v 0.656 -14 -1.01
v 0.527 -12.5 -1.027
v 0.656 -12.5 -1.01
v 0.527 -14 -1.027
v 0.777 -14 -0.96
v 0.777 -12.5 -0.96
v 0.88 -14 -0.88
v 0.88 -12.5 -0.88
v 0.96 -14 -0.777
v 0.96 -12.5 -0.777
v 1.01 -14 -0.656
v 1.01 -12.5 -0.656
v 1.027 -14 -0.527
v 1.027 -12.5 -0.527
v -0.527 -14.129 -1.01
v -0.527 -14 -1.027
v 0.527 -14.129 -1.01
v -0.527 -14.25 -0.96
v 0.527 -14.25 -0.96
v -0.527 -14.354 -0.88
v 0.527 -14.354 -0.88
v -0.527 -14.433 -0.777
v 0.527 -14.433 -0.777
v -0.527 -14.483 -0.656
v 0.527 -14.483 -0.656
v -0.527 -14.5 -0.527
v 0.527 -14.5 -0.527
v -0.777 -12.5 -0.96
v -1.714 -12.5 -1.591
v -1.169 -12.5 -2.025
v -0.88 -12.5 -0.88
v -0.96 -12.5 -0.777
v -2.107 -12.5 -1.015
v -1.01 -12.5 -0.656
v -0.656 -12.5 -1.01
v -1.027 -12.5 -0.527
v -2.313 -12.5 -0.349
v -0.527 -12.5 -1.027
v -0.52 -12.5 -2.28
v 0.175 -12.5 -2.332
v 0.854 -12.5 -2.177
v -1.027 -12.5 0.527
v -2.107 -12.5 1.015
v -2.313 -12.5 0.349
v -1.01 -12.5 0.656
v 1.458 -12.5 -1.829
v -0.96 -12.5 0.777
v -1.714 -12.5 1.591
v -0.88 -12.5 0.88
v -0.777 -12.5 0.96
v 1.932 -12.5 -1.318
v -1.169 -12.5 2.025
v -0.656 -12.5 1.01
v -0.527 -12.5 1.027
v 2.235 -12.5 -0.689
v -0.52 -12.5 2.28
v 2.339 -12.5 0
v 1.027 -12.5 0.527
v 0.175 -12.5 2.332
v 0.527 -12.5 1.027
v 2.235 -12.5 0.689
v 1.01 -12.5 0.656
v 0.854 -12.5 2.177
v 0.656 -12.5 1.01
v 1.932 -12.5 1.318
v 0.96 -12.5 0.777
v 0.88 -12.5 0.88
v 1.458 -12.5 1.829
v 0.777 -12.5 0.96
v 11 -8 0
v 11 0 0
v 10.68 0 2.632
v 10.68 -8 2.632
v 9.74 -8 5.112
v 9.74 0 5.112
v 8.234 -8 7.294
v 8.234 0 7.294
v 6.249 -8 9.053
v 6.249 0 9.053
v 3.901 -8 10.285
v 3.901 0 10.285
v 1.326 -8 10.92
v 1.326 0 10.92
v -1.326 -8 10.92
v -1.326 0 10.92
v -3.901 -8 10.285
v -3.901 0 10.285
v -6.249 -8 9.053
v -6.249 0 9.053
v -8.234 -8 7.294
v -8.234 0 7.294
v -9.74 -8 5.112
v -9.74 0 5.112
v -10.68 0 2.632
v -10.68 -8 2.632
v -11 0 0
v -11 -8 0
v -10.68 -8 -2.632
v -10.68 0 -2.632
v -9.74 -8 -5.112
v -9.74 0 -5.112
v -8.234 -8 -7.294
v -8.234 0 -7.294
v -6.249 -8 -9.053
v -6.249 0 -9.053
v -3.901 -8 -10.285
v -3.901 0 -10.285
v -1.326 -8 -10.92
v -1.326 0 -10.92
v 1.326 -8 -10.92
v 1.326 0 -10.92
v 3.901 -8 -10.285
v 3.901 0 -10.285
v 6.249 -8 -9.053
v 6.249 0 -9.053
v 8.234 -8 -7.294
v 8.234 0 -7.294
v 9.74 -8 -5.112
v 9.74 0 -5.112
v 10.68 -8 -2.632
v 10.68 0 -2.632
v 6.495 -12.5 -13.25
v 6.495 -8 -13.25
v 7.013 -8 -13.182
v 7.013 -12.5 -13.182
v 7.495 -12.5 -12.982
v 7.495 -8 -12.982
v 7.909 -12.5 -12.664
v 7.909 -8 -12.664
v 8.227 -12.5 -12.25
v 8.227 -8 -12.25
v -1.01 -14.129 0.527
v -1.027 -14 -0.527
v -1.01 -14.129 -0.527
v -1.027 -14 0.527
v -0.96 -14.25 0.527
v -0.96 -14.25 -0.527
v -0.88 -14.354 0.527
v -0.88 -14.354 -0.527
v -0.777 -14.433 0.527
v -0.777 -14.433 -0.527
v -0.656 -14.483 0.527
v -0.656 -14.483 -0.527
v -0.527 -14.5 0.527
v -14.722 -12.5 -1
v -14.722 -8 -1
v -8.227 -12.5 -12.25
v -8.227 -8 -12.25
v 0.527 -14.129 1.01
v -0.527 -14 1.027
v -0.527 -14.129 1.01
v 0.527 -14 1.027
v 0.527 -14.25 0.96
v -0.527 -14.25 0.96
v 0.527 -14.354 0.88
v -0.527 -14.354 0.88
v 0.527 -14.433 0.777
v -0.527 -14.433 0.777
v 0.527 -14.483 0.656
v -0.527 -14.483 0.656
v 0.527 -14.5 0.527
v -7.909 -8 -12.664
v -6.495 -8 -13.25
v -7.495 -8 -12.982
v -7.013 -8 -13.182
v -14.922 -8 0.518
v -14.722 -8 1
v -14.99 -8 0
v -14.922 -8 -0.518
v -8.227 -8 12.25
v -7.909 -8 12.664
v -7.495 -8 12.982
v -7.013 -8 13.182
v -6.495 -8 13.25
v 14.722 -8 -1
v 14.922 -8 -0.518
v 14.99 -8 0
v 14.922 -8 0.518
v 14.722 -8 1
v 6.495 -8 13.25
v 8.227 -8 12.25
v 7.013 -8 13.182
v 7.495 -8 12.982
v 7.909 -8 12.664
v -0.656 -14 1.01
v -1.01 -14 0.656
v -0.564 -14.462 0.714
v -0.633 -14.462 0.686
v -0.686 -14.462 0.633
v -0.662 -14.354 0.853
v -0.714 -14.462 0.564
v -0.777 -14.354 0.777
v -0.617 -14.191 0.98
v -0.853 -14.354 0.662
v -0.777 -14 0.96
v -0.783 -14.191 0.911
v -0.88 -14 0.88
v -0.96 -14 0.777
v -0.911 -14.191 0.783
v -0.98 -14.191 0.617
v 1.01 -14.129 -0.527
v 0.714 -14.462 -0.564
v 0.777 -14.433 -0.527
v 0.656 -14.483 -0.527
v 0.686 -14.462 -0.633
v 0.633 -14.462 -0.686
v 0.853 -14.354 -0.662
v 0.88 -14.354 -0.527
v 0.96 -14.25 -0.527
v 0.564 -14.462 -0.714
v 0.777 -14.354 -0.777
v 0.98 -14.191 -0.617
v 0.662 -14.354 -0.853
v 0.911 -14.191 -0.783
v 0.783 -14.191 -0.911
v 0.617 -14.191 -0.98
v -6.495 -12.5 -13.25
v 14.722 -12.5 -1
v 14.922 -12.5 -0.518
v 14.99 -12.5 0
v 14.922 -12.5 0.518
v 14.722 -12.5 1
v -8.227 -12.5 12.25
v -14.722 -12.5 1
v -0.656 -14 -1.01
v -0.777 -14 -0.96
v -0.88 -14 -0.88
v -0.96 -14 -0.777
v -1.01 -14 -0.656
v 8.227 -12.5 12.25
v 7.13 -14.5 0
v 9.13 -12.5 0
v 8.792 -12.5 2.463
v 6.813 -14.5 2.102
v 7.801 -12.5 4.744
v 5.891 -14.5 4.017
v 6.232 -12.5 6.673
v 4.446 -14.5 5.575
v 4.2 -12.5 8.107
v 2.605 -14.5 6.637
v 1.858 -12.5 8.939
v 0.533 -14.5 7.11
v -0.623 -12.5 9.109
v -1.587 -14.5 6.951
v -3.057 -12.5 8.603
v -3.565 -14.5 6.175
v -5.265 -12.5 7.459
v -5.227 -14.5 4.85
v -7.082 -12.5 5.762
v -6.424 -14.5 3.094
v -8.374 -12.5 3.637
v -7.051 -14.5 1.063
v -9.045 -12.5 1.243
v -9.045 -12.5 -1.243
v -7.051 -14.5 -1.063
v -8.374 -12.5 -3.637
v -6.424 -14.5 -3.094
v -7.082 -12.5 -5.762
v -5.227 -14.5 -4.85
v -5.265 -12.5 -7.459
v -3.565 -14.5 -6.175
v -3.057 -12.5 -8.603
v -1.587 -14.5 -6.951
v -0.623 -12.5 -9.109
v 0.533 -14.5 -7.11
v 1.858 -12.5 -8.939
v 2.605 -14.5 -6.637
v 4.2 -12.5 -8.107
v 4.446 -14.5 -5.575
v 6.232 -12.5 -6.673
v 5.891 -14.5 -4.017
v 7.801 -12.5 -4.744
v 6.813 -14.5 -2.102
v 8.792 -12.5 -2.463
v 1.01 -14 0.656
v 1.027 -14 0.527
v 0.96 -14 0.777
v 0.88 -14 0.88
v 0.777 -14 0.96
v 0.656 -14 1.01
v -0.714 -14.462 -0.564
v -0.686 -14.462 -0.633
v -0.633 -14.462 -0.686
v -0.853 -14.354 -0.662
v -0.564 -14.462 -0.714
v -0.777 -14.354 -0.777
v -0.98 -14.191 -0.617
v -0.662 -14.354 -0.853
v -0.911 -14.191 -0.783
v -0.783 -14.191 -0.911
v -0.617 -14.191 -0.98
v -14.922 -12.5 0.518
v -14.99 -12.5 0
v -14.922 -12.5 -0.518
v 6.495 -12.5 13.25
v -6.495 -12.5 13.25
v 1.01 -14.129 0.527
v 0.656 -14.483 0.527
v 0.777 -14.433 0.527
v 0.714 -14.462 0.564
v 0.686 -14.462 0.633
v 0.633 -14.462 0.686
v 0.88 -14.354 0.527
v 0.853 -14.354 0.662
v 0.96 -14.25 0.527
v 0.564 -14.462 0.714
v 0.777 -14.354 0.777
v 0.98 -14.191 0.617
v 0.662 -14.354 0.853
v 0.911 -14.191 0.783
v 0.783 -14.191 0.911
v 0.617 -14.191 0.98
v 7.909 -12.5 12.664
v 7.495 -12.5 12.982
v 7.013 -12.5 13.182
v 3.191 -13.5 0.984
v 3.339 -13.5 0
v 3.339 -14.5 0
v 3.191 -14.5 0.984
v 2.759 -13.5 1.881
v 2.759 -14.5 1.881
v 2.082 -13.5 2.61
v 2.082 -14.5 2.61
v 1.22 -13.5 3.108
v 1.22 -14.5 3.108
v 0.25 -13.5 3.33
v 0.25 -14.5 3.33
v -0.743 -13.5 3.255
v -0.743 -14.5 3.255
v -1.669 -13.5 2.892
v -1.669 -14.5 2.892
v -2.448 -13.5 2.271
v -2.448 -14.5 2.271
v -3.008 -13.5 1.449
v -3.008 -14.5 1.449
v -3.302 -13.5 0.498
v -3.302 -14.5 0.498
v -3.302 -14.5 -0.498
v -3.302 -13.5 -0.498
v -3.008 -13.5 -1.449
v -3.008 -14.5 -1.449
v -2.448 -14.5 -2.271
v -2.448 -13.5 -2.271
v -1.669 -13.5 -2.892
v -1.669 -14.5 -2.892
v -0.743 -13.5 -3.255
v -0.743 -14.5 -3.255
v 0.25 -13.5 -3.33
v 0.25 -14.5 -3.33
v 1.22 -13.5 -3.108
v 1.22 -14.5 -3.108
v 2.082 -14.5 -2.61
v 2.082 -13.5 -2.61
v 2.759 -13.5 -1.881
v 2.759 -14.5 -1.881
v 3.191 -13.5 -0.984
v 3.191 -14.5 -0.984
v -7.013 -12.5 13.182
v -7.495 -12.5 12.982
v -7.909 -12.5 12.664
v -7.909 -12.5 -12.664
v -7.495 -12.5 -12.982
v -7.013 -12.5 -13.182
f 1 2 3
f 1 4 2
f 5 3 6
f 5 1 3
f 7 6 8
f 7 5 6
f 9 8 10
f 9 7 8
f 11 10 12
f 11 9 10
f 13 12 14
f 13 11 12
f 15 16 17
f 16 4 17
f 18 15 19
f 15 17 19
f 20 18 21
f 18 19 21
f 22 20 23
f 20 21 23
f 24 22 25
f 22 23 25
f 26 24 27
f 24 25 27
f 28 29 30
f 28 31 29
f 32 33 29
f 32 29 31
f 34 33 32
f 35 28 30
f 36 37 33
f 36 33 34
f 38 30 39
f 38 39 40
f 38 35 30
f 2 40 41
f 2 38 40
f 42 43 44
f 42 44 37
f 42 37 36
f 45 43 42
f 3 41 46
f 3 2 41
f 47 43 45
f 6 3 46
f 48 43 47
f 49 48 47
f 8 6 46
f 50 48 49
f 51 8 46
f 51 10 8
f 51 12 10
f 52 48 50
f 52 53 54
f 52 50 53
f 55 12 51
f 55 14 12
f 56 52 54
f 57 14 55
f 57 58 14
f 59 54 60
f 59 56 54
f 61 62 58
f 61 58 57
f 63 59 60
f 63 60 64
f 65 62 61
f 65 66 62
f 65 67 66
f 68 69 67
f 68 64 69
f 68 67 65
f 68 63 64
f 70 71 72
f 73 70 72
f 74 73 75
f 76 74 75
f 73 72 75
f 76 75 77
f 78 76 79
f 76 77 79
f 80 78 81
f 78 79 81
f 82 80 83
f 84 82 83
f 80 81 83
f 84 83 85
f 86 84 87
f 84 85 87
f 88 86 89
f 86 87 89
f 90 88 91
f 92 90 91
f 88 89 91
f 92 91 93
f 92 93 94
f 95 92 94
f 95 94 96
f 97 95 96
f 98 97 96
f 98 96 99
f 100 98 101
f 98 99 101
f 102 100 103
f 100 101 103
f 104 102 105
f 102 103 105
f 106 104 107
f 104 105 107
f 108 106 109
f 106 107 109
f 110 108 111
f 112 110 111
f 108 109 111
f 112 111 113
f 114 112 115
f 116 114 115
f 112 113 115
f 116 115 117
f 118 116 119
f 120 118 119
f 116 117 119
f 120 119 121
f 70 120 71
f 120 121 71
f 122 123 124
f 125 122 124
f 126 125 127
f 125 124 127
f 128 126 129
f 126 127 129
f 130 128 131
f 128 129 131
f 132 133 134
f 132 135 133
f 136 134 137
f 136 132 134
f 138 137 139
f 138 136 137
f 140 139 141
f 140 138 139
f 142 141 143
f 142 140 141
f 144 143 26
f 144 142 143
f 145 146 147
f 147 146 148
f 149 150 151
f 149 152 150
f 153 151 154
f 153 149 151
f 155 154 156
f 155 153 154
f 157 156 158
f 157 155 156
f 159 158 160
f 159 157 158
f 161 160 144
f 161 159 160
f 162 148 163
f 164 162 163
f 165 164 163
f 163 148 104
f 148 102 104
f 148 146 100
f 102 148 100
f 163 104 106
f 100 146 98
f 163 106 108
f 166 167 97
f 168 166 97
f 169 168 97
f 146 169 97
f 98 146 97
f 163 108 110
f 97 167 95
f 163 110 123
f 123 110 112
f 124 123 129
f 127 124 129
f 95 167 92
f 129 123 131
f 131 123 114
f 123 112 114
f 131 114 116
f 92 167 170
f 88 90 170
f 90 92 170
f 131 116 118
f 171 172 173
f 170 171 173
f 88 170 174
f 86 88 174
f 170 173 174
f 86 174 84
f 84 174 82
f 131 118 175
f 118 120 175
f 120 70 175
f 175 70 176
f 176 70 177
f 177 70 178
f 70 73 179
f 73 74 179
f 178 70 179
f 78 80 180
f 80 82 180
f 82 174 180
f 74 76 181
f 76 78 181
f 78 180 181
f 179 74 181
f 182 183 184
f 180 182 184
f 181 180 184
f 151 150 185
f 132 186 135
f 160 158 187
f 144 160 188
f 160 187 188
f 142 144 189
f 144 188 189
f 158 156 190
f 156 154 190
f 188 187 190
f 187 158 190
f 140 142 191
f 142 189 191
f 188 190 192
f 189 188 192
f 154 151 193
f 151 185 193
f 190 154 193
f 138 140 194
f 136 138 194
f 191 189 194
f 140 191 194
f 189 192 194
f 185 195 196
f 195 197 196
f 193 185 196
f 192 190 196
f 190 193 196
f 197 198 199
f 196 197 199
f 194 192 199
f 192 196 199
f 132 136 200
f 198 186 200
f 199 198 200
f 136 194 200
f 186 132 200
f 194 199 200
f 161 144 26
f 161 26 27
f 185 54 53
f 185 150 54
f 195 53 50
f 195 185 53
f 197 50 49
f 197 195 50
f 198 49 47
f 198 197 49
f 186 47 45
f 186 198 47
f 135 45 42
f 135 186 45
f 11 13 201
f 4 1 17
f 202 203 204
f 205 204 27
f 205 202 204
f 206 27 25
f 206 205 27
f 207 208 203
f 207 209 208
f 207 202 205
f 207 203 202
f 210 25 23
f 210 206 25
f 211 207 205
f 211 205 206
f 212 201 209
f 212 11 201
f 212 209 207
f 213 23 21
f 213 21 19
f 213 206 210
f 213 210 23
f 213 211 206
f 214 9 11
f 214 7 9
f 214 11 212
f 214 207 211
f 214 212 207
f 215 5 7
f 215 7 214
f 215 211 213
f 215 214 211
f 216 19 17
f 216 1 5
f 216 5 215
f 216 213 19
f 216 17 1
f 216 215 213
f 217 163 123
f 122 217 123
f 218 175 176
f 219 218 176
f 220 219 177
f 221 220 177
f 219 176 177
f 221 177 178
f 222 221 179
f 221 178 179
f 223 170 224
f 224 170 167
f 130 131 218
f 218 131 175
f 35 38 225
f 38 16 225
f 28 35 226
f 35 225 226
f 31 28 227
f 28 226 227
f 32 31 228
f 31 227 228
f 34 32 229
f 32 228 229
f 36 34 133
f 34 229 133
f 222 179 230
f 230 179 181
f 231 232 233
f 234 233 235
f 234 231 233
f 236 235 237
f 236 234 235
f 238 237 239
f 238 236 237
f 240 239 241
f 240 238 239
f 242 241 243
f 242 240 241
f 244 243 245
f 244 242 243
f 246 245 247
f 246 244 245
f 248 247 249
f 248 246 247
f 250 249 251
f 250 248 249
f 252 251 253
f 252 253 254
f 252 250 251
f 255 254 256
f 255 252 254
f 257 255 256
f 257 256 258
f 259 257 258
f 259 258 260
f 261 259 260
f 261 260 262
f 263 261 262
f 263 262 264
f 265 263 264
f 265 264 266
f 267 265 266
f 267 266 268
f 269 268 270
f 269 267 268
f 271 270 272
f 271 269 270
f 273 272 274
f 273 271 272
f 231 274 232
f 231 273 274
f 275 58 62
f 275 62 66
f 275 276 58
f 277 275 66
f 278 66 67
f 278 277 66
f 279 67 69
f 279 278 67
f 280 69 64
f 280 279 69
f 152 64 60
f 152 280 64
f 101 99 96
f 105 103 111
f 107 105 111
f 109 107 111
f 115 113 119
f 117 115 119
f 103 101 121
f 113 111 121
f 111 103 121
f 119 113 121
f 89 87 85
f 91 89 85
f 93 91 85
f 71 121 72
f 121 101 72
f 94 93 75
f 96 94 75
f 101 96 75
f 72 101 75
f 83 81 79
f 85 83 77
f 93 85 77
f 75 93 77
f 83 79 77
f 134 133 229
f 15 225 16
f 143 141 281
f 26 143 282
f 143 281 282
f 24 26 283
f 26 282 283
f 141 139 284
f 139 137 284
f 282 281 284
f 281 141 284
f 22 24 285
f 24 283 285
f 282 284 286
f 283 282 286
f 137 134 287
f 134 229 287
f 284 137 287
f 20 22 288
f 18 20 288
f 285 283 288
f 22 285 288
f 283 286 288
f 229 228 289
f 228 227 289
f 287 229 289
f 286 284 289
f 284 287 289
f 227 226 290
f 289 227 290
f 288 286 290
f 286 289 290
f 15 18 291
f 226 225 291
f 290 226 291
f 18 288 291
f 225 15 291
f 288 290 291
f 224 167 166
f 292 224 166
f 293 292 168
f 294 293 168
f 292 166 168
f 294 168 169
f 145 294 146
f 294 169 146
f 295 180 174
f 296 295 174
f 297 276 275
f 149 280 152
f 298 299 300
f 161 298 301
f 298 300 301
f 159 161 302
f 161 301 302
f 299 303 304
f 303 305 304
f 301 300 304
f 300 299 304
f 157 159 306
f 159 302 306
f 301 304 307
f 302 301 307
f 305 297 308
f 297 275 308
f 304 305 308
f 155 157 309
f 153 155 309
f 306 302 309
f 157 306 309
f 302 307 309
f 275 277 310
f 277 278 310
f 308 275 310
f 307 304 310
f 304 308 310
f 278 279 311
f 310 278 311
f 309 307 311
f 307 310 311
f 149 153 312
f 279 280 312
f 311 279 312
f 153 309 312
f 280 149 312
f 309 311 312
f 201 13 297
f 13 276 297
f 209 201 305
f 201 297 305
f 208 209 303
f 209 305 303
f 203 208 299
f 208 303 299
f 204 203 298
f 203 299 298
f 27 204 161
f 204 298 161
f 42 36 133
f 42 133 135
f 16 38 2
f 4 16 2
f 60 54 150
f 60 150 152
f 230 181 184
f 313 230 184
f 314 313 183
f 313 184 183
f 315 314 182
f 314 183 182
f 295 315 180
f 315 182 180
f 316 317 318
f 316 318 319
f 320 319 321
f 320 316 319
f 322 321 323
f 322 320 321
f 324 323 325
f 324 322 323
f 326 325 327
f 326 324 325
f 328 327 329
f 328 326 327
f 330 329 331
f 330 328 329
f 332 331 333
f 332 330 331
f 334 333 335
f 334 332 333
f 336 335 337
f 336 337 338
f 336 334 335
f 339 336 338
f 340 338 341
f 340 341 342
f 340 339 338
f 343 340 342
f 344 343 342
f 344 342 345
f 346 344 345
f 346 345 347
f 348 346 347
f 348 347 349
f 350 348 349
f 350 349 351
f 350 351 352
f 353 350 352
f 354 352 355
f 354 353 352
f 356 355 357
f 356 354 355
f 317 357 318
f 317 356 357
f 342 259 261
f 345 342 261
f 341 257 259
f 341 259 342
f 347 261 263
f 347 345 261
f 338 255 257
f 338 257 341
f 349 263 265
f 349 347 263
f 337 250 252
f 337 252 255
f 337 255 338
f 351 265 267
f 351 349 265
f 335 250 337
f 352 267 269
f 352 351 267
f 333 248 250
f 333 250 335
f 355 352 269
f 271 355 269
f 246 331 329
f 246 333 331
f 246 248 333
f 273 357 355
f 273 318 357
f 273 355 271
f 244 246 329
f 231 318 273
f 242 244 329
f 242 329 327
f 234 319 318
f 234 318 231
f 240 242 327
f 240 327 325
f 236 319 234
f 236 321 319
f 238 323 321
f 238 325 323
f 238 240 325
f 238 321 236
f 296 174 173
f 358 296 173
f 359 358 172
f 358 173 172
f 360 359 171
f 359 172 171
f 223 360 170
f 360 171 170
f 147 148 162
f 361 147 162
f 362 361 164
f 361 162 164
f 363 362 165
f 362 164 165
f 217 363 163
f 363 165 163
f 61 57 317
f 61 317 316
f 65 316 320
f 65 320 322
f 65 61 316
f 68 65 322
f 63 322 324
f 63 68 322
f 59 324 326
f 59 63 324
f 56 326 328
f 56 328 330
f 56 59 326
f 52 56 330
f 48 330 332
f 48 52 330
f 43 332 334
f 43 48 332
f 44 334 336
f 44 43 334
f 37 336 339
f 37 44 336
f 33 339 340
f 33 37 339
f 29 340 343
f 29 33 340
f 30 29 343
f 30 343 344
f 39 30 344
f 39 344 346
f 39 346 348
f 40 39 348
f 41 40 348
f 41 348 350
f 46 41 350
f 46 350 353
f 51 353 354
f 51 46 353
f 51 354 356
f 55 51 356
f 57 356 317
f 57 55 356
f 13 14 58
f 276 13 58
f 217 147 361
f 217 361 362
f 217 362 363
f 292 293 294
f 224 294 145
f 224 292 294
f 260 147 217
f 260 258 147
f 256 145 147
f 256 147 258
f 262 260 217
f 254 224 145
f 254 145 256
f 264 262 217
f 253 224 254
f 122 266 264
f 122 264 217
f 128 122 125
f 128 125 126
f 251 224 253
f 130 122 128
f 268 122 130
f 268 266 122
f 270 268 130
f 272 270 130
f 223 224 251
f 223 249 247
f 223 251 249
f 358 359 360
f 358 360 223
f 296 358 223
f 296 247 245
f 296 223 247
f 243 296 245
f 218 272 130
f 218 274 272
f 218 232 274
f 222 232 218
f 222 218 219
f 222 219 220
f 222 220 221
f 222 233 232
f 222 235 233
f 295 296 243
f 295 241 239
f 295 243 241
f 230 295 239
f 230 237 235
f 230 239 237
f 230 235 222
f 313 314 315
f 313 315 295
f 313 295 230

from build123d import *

# Parameters (mm, degrees)
F0_R     = 11
F1_DEPTH = 8
F3_DEPTH = 4.5
F4_R     = 12.1301412178
F4_R_2   = 3.338839996
F5_DEPTH = 2
F7_SIZE  = 1
F8_W     = 2.0535623771
F8_H     = 2.0535623771
F9_DEPTH = 2
F10_R    = 0.5


# Not quite as in the source:
# - a fillet or chamfer that OpenCascade refuses, or shapes differently, is made with other operations: its cross-section is extruded or revolved along the edge and cut away or added


with BuildPart() as f1:
    # F0 (on Front) → F1 (new body)
    with BuildSketch(Plane.XZ):
        Circle(F0_R)
    extrude(amount=F1_DEPTH)

    # F2 (on face) → F3 (join)
    with BuildSketch(Plane.XZ.offset(8)):
        with BuildLine():
            Line((6.4951905284, 13.25), (-6.4951905284, 13.25))
            ThreePointArc((-6.4951905284, 13.25), (-7.4951905284, 12.9820508076), (-8.227241336, 12.25))
            Line((-8.227241336, 12.25), (-14.7224318643, 1))
            ThreePointArc((-14.7224318643, 1), (-14.9903810568, 0), (-14.7224318643, -1))
            Line((-14.7224318643, -1), (-8.227241336, -12.25))
            ThreePointArc((-8.227241336, -12.25), (-7.4951905284, -12.9820508076), (-6.4951905284, -13.25))
            Line((-6.4951905284, -13.25), (6.4951905284, -13.25))
            ThreePointArc((6.4951905284, -13.25), (7.4951905284, -12.9820508076), (8.227241336, -12.25))
            Line((8.227241336, -12.25), (14.7224318643, -1))
            ThreePointArc((14.7224318643, -1), (14.9903810568, 0), (14.7224318643, 1))
            Line((14.7224318643, 1), (8.227241336, 12.25))
            ThreePointArc((8.227241336, 12.25), (7.4951905284, 12.9820508076), (6.4951905284, 13.25))
        make_face()
    extrude(amount=F3_DEPTH)

    # F4 (on face) → F5 (join)
    with BuildSketch(Plane.XZ.offset(12.5)):
        Circle(F4_R)
        Circle(F4_R_2, mode=Mode.SUBTRACT)
    extrude(amount=F5_DEPTH)

    # F6: chamfer of 5 on 1 edges, made by hand


with BuildPart() as f6_tool2:
    # F6_s3 → F6_t4 (revolve)
    with BuildSketch(Plane.XY):
        Polygon((12.1301412178, -9.5), (7.1301412178, -14.5), (12.1301412178, -14.5), align=None)
    revolve(axis=Axis((0, -14.5, 0), (0, -1, 0)))

    split(bisect_by=Plane.XZ.offset(12.5), keep=Keep.TOP)


with BuildPart() as f1_1:
    add(f1.part)

    # F6_t1: cut F6_tool2
    add(f6_tool2.part, mode=Mode.SUBTRACT)

    # F7
    f7_edges = [f1_1.edges().sort_by_distance(p)[0] for p in [
        (-3.33884, -12.5, 0),
    ]]
    chamfer(f7_edges, length=F7_SIZE)

    # F8 (on face) → F9 (join)
    with BuildSketch(Plane.XZ.offset(12.5)):
        Rectangle(F8_W, F8_H)
    extrude(amount=F9_DEPTH)

    # F10
    f10_edges = [f1_1.edges().sort_by_distance(p)[0] for p in [
        (1.026781, -13.5, -1.026781),
        (-1.026781, -13.5, -1.026781),
        (-1.026781, -13.5, 1.026781),
        (1.026781, -13.5, 1.026781),
        (1.026781, -14.5, 0),
        (0, -14.5, 1.026781),
        (-1.026781, -14.5, 0),
        (0, -14.5, -1.026781),
    ]]
    fillet(f10_edges, radius=F10_R)


solid = f1_1.part
